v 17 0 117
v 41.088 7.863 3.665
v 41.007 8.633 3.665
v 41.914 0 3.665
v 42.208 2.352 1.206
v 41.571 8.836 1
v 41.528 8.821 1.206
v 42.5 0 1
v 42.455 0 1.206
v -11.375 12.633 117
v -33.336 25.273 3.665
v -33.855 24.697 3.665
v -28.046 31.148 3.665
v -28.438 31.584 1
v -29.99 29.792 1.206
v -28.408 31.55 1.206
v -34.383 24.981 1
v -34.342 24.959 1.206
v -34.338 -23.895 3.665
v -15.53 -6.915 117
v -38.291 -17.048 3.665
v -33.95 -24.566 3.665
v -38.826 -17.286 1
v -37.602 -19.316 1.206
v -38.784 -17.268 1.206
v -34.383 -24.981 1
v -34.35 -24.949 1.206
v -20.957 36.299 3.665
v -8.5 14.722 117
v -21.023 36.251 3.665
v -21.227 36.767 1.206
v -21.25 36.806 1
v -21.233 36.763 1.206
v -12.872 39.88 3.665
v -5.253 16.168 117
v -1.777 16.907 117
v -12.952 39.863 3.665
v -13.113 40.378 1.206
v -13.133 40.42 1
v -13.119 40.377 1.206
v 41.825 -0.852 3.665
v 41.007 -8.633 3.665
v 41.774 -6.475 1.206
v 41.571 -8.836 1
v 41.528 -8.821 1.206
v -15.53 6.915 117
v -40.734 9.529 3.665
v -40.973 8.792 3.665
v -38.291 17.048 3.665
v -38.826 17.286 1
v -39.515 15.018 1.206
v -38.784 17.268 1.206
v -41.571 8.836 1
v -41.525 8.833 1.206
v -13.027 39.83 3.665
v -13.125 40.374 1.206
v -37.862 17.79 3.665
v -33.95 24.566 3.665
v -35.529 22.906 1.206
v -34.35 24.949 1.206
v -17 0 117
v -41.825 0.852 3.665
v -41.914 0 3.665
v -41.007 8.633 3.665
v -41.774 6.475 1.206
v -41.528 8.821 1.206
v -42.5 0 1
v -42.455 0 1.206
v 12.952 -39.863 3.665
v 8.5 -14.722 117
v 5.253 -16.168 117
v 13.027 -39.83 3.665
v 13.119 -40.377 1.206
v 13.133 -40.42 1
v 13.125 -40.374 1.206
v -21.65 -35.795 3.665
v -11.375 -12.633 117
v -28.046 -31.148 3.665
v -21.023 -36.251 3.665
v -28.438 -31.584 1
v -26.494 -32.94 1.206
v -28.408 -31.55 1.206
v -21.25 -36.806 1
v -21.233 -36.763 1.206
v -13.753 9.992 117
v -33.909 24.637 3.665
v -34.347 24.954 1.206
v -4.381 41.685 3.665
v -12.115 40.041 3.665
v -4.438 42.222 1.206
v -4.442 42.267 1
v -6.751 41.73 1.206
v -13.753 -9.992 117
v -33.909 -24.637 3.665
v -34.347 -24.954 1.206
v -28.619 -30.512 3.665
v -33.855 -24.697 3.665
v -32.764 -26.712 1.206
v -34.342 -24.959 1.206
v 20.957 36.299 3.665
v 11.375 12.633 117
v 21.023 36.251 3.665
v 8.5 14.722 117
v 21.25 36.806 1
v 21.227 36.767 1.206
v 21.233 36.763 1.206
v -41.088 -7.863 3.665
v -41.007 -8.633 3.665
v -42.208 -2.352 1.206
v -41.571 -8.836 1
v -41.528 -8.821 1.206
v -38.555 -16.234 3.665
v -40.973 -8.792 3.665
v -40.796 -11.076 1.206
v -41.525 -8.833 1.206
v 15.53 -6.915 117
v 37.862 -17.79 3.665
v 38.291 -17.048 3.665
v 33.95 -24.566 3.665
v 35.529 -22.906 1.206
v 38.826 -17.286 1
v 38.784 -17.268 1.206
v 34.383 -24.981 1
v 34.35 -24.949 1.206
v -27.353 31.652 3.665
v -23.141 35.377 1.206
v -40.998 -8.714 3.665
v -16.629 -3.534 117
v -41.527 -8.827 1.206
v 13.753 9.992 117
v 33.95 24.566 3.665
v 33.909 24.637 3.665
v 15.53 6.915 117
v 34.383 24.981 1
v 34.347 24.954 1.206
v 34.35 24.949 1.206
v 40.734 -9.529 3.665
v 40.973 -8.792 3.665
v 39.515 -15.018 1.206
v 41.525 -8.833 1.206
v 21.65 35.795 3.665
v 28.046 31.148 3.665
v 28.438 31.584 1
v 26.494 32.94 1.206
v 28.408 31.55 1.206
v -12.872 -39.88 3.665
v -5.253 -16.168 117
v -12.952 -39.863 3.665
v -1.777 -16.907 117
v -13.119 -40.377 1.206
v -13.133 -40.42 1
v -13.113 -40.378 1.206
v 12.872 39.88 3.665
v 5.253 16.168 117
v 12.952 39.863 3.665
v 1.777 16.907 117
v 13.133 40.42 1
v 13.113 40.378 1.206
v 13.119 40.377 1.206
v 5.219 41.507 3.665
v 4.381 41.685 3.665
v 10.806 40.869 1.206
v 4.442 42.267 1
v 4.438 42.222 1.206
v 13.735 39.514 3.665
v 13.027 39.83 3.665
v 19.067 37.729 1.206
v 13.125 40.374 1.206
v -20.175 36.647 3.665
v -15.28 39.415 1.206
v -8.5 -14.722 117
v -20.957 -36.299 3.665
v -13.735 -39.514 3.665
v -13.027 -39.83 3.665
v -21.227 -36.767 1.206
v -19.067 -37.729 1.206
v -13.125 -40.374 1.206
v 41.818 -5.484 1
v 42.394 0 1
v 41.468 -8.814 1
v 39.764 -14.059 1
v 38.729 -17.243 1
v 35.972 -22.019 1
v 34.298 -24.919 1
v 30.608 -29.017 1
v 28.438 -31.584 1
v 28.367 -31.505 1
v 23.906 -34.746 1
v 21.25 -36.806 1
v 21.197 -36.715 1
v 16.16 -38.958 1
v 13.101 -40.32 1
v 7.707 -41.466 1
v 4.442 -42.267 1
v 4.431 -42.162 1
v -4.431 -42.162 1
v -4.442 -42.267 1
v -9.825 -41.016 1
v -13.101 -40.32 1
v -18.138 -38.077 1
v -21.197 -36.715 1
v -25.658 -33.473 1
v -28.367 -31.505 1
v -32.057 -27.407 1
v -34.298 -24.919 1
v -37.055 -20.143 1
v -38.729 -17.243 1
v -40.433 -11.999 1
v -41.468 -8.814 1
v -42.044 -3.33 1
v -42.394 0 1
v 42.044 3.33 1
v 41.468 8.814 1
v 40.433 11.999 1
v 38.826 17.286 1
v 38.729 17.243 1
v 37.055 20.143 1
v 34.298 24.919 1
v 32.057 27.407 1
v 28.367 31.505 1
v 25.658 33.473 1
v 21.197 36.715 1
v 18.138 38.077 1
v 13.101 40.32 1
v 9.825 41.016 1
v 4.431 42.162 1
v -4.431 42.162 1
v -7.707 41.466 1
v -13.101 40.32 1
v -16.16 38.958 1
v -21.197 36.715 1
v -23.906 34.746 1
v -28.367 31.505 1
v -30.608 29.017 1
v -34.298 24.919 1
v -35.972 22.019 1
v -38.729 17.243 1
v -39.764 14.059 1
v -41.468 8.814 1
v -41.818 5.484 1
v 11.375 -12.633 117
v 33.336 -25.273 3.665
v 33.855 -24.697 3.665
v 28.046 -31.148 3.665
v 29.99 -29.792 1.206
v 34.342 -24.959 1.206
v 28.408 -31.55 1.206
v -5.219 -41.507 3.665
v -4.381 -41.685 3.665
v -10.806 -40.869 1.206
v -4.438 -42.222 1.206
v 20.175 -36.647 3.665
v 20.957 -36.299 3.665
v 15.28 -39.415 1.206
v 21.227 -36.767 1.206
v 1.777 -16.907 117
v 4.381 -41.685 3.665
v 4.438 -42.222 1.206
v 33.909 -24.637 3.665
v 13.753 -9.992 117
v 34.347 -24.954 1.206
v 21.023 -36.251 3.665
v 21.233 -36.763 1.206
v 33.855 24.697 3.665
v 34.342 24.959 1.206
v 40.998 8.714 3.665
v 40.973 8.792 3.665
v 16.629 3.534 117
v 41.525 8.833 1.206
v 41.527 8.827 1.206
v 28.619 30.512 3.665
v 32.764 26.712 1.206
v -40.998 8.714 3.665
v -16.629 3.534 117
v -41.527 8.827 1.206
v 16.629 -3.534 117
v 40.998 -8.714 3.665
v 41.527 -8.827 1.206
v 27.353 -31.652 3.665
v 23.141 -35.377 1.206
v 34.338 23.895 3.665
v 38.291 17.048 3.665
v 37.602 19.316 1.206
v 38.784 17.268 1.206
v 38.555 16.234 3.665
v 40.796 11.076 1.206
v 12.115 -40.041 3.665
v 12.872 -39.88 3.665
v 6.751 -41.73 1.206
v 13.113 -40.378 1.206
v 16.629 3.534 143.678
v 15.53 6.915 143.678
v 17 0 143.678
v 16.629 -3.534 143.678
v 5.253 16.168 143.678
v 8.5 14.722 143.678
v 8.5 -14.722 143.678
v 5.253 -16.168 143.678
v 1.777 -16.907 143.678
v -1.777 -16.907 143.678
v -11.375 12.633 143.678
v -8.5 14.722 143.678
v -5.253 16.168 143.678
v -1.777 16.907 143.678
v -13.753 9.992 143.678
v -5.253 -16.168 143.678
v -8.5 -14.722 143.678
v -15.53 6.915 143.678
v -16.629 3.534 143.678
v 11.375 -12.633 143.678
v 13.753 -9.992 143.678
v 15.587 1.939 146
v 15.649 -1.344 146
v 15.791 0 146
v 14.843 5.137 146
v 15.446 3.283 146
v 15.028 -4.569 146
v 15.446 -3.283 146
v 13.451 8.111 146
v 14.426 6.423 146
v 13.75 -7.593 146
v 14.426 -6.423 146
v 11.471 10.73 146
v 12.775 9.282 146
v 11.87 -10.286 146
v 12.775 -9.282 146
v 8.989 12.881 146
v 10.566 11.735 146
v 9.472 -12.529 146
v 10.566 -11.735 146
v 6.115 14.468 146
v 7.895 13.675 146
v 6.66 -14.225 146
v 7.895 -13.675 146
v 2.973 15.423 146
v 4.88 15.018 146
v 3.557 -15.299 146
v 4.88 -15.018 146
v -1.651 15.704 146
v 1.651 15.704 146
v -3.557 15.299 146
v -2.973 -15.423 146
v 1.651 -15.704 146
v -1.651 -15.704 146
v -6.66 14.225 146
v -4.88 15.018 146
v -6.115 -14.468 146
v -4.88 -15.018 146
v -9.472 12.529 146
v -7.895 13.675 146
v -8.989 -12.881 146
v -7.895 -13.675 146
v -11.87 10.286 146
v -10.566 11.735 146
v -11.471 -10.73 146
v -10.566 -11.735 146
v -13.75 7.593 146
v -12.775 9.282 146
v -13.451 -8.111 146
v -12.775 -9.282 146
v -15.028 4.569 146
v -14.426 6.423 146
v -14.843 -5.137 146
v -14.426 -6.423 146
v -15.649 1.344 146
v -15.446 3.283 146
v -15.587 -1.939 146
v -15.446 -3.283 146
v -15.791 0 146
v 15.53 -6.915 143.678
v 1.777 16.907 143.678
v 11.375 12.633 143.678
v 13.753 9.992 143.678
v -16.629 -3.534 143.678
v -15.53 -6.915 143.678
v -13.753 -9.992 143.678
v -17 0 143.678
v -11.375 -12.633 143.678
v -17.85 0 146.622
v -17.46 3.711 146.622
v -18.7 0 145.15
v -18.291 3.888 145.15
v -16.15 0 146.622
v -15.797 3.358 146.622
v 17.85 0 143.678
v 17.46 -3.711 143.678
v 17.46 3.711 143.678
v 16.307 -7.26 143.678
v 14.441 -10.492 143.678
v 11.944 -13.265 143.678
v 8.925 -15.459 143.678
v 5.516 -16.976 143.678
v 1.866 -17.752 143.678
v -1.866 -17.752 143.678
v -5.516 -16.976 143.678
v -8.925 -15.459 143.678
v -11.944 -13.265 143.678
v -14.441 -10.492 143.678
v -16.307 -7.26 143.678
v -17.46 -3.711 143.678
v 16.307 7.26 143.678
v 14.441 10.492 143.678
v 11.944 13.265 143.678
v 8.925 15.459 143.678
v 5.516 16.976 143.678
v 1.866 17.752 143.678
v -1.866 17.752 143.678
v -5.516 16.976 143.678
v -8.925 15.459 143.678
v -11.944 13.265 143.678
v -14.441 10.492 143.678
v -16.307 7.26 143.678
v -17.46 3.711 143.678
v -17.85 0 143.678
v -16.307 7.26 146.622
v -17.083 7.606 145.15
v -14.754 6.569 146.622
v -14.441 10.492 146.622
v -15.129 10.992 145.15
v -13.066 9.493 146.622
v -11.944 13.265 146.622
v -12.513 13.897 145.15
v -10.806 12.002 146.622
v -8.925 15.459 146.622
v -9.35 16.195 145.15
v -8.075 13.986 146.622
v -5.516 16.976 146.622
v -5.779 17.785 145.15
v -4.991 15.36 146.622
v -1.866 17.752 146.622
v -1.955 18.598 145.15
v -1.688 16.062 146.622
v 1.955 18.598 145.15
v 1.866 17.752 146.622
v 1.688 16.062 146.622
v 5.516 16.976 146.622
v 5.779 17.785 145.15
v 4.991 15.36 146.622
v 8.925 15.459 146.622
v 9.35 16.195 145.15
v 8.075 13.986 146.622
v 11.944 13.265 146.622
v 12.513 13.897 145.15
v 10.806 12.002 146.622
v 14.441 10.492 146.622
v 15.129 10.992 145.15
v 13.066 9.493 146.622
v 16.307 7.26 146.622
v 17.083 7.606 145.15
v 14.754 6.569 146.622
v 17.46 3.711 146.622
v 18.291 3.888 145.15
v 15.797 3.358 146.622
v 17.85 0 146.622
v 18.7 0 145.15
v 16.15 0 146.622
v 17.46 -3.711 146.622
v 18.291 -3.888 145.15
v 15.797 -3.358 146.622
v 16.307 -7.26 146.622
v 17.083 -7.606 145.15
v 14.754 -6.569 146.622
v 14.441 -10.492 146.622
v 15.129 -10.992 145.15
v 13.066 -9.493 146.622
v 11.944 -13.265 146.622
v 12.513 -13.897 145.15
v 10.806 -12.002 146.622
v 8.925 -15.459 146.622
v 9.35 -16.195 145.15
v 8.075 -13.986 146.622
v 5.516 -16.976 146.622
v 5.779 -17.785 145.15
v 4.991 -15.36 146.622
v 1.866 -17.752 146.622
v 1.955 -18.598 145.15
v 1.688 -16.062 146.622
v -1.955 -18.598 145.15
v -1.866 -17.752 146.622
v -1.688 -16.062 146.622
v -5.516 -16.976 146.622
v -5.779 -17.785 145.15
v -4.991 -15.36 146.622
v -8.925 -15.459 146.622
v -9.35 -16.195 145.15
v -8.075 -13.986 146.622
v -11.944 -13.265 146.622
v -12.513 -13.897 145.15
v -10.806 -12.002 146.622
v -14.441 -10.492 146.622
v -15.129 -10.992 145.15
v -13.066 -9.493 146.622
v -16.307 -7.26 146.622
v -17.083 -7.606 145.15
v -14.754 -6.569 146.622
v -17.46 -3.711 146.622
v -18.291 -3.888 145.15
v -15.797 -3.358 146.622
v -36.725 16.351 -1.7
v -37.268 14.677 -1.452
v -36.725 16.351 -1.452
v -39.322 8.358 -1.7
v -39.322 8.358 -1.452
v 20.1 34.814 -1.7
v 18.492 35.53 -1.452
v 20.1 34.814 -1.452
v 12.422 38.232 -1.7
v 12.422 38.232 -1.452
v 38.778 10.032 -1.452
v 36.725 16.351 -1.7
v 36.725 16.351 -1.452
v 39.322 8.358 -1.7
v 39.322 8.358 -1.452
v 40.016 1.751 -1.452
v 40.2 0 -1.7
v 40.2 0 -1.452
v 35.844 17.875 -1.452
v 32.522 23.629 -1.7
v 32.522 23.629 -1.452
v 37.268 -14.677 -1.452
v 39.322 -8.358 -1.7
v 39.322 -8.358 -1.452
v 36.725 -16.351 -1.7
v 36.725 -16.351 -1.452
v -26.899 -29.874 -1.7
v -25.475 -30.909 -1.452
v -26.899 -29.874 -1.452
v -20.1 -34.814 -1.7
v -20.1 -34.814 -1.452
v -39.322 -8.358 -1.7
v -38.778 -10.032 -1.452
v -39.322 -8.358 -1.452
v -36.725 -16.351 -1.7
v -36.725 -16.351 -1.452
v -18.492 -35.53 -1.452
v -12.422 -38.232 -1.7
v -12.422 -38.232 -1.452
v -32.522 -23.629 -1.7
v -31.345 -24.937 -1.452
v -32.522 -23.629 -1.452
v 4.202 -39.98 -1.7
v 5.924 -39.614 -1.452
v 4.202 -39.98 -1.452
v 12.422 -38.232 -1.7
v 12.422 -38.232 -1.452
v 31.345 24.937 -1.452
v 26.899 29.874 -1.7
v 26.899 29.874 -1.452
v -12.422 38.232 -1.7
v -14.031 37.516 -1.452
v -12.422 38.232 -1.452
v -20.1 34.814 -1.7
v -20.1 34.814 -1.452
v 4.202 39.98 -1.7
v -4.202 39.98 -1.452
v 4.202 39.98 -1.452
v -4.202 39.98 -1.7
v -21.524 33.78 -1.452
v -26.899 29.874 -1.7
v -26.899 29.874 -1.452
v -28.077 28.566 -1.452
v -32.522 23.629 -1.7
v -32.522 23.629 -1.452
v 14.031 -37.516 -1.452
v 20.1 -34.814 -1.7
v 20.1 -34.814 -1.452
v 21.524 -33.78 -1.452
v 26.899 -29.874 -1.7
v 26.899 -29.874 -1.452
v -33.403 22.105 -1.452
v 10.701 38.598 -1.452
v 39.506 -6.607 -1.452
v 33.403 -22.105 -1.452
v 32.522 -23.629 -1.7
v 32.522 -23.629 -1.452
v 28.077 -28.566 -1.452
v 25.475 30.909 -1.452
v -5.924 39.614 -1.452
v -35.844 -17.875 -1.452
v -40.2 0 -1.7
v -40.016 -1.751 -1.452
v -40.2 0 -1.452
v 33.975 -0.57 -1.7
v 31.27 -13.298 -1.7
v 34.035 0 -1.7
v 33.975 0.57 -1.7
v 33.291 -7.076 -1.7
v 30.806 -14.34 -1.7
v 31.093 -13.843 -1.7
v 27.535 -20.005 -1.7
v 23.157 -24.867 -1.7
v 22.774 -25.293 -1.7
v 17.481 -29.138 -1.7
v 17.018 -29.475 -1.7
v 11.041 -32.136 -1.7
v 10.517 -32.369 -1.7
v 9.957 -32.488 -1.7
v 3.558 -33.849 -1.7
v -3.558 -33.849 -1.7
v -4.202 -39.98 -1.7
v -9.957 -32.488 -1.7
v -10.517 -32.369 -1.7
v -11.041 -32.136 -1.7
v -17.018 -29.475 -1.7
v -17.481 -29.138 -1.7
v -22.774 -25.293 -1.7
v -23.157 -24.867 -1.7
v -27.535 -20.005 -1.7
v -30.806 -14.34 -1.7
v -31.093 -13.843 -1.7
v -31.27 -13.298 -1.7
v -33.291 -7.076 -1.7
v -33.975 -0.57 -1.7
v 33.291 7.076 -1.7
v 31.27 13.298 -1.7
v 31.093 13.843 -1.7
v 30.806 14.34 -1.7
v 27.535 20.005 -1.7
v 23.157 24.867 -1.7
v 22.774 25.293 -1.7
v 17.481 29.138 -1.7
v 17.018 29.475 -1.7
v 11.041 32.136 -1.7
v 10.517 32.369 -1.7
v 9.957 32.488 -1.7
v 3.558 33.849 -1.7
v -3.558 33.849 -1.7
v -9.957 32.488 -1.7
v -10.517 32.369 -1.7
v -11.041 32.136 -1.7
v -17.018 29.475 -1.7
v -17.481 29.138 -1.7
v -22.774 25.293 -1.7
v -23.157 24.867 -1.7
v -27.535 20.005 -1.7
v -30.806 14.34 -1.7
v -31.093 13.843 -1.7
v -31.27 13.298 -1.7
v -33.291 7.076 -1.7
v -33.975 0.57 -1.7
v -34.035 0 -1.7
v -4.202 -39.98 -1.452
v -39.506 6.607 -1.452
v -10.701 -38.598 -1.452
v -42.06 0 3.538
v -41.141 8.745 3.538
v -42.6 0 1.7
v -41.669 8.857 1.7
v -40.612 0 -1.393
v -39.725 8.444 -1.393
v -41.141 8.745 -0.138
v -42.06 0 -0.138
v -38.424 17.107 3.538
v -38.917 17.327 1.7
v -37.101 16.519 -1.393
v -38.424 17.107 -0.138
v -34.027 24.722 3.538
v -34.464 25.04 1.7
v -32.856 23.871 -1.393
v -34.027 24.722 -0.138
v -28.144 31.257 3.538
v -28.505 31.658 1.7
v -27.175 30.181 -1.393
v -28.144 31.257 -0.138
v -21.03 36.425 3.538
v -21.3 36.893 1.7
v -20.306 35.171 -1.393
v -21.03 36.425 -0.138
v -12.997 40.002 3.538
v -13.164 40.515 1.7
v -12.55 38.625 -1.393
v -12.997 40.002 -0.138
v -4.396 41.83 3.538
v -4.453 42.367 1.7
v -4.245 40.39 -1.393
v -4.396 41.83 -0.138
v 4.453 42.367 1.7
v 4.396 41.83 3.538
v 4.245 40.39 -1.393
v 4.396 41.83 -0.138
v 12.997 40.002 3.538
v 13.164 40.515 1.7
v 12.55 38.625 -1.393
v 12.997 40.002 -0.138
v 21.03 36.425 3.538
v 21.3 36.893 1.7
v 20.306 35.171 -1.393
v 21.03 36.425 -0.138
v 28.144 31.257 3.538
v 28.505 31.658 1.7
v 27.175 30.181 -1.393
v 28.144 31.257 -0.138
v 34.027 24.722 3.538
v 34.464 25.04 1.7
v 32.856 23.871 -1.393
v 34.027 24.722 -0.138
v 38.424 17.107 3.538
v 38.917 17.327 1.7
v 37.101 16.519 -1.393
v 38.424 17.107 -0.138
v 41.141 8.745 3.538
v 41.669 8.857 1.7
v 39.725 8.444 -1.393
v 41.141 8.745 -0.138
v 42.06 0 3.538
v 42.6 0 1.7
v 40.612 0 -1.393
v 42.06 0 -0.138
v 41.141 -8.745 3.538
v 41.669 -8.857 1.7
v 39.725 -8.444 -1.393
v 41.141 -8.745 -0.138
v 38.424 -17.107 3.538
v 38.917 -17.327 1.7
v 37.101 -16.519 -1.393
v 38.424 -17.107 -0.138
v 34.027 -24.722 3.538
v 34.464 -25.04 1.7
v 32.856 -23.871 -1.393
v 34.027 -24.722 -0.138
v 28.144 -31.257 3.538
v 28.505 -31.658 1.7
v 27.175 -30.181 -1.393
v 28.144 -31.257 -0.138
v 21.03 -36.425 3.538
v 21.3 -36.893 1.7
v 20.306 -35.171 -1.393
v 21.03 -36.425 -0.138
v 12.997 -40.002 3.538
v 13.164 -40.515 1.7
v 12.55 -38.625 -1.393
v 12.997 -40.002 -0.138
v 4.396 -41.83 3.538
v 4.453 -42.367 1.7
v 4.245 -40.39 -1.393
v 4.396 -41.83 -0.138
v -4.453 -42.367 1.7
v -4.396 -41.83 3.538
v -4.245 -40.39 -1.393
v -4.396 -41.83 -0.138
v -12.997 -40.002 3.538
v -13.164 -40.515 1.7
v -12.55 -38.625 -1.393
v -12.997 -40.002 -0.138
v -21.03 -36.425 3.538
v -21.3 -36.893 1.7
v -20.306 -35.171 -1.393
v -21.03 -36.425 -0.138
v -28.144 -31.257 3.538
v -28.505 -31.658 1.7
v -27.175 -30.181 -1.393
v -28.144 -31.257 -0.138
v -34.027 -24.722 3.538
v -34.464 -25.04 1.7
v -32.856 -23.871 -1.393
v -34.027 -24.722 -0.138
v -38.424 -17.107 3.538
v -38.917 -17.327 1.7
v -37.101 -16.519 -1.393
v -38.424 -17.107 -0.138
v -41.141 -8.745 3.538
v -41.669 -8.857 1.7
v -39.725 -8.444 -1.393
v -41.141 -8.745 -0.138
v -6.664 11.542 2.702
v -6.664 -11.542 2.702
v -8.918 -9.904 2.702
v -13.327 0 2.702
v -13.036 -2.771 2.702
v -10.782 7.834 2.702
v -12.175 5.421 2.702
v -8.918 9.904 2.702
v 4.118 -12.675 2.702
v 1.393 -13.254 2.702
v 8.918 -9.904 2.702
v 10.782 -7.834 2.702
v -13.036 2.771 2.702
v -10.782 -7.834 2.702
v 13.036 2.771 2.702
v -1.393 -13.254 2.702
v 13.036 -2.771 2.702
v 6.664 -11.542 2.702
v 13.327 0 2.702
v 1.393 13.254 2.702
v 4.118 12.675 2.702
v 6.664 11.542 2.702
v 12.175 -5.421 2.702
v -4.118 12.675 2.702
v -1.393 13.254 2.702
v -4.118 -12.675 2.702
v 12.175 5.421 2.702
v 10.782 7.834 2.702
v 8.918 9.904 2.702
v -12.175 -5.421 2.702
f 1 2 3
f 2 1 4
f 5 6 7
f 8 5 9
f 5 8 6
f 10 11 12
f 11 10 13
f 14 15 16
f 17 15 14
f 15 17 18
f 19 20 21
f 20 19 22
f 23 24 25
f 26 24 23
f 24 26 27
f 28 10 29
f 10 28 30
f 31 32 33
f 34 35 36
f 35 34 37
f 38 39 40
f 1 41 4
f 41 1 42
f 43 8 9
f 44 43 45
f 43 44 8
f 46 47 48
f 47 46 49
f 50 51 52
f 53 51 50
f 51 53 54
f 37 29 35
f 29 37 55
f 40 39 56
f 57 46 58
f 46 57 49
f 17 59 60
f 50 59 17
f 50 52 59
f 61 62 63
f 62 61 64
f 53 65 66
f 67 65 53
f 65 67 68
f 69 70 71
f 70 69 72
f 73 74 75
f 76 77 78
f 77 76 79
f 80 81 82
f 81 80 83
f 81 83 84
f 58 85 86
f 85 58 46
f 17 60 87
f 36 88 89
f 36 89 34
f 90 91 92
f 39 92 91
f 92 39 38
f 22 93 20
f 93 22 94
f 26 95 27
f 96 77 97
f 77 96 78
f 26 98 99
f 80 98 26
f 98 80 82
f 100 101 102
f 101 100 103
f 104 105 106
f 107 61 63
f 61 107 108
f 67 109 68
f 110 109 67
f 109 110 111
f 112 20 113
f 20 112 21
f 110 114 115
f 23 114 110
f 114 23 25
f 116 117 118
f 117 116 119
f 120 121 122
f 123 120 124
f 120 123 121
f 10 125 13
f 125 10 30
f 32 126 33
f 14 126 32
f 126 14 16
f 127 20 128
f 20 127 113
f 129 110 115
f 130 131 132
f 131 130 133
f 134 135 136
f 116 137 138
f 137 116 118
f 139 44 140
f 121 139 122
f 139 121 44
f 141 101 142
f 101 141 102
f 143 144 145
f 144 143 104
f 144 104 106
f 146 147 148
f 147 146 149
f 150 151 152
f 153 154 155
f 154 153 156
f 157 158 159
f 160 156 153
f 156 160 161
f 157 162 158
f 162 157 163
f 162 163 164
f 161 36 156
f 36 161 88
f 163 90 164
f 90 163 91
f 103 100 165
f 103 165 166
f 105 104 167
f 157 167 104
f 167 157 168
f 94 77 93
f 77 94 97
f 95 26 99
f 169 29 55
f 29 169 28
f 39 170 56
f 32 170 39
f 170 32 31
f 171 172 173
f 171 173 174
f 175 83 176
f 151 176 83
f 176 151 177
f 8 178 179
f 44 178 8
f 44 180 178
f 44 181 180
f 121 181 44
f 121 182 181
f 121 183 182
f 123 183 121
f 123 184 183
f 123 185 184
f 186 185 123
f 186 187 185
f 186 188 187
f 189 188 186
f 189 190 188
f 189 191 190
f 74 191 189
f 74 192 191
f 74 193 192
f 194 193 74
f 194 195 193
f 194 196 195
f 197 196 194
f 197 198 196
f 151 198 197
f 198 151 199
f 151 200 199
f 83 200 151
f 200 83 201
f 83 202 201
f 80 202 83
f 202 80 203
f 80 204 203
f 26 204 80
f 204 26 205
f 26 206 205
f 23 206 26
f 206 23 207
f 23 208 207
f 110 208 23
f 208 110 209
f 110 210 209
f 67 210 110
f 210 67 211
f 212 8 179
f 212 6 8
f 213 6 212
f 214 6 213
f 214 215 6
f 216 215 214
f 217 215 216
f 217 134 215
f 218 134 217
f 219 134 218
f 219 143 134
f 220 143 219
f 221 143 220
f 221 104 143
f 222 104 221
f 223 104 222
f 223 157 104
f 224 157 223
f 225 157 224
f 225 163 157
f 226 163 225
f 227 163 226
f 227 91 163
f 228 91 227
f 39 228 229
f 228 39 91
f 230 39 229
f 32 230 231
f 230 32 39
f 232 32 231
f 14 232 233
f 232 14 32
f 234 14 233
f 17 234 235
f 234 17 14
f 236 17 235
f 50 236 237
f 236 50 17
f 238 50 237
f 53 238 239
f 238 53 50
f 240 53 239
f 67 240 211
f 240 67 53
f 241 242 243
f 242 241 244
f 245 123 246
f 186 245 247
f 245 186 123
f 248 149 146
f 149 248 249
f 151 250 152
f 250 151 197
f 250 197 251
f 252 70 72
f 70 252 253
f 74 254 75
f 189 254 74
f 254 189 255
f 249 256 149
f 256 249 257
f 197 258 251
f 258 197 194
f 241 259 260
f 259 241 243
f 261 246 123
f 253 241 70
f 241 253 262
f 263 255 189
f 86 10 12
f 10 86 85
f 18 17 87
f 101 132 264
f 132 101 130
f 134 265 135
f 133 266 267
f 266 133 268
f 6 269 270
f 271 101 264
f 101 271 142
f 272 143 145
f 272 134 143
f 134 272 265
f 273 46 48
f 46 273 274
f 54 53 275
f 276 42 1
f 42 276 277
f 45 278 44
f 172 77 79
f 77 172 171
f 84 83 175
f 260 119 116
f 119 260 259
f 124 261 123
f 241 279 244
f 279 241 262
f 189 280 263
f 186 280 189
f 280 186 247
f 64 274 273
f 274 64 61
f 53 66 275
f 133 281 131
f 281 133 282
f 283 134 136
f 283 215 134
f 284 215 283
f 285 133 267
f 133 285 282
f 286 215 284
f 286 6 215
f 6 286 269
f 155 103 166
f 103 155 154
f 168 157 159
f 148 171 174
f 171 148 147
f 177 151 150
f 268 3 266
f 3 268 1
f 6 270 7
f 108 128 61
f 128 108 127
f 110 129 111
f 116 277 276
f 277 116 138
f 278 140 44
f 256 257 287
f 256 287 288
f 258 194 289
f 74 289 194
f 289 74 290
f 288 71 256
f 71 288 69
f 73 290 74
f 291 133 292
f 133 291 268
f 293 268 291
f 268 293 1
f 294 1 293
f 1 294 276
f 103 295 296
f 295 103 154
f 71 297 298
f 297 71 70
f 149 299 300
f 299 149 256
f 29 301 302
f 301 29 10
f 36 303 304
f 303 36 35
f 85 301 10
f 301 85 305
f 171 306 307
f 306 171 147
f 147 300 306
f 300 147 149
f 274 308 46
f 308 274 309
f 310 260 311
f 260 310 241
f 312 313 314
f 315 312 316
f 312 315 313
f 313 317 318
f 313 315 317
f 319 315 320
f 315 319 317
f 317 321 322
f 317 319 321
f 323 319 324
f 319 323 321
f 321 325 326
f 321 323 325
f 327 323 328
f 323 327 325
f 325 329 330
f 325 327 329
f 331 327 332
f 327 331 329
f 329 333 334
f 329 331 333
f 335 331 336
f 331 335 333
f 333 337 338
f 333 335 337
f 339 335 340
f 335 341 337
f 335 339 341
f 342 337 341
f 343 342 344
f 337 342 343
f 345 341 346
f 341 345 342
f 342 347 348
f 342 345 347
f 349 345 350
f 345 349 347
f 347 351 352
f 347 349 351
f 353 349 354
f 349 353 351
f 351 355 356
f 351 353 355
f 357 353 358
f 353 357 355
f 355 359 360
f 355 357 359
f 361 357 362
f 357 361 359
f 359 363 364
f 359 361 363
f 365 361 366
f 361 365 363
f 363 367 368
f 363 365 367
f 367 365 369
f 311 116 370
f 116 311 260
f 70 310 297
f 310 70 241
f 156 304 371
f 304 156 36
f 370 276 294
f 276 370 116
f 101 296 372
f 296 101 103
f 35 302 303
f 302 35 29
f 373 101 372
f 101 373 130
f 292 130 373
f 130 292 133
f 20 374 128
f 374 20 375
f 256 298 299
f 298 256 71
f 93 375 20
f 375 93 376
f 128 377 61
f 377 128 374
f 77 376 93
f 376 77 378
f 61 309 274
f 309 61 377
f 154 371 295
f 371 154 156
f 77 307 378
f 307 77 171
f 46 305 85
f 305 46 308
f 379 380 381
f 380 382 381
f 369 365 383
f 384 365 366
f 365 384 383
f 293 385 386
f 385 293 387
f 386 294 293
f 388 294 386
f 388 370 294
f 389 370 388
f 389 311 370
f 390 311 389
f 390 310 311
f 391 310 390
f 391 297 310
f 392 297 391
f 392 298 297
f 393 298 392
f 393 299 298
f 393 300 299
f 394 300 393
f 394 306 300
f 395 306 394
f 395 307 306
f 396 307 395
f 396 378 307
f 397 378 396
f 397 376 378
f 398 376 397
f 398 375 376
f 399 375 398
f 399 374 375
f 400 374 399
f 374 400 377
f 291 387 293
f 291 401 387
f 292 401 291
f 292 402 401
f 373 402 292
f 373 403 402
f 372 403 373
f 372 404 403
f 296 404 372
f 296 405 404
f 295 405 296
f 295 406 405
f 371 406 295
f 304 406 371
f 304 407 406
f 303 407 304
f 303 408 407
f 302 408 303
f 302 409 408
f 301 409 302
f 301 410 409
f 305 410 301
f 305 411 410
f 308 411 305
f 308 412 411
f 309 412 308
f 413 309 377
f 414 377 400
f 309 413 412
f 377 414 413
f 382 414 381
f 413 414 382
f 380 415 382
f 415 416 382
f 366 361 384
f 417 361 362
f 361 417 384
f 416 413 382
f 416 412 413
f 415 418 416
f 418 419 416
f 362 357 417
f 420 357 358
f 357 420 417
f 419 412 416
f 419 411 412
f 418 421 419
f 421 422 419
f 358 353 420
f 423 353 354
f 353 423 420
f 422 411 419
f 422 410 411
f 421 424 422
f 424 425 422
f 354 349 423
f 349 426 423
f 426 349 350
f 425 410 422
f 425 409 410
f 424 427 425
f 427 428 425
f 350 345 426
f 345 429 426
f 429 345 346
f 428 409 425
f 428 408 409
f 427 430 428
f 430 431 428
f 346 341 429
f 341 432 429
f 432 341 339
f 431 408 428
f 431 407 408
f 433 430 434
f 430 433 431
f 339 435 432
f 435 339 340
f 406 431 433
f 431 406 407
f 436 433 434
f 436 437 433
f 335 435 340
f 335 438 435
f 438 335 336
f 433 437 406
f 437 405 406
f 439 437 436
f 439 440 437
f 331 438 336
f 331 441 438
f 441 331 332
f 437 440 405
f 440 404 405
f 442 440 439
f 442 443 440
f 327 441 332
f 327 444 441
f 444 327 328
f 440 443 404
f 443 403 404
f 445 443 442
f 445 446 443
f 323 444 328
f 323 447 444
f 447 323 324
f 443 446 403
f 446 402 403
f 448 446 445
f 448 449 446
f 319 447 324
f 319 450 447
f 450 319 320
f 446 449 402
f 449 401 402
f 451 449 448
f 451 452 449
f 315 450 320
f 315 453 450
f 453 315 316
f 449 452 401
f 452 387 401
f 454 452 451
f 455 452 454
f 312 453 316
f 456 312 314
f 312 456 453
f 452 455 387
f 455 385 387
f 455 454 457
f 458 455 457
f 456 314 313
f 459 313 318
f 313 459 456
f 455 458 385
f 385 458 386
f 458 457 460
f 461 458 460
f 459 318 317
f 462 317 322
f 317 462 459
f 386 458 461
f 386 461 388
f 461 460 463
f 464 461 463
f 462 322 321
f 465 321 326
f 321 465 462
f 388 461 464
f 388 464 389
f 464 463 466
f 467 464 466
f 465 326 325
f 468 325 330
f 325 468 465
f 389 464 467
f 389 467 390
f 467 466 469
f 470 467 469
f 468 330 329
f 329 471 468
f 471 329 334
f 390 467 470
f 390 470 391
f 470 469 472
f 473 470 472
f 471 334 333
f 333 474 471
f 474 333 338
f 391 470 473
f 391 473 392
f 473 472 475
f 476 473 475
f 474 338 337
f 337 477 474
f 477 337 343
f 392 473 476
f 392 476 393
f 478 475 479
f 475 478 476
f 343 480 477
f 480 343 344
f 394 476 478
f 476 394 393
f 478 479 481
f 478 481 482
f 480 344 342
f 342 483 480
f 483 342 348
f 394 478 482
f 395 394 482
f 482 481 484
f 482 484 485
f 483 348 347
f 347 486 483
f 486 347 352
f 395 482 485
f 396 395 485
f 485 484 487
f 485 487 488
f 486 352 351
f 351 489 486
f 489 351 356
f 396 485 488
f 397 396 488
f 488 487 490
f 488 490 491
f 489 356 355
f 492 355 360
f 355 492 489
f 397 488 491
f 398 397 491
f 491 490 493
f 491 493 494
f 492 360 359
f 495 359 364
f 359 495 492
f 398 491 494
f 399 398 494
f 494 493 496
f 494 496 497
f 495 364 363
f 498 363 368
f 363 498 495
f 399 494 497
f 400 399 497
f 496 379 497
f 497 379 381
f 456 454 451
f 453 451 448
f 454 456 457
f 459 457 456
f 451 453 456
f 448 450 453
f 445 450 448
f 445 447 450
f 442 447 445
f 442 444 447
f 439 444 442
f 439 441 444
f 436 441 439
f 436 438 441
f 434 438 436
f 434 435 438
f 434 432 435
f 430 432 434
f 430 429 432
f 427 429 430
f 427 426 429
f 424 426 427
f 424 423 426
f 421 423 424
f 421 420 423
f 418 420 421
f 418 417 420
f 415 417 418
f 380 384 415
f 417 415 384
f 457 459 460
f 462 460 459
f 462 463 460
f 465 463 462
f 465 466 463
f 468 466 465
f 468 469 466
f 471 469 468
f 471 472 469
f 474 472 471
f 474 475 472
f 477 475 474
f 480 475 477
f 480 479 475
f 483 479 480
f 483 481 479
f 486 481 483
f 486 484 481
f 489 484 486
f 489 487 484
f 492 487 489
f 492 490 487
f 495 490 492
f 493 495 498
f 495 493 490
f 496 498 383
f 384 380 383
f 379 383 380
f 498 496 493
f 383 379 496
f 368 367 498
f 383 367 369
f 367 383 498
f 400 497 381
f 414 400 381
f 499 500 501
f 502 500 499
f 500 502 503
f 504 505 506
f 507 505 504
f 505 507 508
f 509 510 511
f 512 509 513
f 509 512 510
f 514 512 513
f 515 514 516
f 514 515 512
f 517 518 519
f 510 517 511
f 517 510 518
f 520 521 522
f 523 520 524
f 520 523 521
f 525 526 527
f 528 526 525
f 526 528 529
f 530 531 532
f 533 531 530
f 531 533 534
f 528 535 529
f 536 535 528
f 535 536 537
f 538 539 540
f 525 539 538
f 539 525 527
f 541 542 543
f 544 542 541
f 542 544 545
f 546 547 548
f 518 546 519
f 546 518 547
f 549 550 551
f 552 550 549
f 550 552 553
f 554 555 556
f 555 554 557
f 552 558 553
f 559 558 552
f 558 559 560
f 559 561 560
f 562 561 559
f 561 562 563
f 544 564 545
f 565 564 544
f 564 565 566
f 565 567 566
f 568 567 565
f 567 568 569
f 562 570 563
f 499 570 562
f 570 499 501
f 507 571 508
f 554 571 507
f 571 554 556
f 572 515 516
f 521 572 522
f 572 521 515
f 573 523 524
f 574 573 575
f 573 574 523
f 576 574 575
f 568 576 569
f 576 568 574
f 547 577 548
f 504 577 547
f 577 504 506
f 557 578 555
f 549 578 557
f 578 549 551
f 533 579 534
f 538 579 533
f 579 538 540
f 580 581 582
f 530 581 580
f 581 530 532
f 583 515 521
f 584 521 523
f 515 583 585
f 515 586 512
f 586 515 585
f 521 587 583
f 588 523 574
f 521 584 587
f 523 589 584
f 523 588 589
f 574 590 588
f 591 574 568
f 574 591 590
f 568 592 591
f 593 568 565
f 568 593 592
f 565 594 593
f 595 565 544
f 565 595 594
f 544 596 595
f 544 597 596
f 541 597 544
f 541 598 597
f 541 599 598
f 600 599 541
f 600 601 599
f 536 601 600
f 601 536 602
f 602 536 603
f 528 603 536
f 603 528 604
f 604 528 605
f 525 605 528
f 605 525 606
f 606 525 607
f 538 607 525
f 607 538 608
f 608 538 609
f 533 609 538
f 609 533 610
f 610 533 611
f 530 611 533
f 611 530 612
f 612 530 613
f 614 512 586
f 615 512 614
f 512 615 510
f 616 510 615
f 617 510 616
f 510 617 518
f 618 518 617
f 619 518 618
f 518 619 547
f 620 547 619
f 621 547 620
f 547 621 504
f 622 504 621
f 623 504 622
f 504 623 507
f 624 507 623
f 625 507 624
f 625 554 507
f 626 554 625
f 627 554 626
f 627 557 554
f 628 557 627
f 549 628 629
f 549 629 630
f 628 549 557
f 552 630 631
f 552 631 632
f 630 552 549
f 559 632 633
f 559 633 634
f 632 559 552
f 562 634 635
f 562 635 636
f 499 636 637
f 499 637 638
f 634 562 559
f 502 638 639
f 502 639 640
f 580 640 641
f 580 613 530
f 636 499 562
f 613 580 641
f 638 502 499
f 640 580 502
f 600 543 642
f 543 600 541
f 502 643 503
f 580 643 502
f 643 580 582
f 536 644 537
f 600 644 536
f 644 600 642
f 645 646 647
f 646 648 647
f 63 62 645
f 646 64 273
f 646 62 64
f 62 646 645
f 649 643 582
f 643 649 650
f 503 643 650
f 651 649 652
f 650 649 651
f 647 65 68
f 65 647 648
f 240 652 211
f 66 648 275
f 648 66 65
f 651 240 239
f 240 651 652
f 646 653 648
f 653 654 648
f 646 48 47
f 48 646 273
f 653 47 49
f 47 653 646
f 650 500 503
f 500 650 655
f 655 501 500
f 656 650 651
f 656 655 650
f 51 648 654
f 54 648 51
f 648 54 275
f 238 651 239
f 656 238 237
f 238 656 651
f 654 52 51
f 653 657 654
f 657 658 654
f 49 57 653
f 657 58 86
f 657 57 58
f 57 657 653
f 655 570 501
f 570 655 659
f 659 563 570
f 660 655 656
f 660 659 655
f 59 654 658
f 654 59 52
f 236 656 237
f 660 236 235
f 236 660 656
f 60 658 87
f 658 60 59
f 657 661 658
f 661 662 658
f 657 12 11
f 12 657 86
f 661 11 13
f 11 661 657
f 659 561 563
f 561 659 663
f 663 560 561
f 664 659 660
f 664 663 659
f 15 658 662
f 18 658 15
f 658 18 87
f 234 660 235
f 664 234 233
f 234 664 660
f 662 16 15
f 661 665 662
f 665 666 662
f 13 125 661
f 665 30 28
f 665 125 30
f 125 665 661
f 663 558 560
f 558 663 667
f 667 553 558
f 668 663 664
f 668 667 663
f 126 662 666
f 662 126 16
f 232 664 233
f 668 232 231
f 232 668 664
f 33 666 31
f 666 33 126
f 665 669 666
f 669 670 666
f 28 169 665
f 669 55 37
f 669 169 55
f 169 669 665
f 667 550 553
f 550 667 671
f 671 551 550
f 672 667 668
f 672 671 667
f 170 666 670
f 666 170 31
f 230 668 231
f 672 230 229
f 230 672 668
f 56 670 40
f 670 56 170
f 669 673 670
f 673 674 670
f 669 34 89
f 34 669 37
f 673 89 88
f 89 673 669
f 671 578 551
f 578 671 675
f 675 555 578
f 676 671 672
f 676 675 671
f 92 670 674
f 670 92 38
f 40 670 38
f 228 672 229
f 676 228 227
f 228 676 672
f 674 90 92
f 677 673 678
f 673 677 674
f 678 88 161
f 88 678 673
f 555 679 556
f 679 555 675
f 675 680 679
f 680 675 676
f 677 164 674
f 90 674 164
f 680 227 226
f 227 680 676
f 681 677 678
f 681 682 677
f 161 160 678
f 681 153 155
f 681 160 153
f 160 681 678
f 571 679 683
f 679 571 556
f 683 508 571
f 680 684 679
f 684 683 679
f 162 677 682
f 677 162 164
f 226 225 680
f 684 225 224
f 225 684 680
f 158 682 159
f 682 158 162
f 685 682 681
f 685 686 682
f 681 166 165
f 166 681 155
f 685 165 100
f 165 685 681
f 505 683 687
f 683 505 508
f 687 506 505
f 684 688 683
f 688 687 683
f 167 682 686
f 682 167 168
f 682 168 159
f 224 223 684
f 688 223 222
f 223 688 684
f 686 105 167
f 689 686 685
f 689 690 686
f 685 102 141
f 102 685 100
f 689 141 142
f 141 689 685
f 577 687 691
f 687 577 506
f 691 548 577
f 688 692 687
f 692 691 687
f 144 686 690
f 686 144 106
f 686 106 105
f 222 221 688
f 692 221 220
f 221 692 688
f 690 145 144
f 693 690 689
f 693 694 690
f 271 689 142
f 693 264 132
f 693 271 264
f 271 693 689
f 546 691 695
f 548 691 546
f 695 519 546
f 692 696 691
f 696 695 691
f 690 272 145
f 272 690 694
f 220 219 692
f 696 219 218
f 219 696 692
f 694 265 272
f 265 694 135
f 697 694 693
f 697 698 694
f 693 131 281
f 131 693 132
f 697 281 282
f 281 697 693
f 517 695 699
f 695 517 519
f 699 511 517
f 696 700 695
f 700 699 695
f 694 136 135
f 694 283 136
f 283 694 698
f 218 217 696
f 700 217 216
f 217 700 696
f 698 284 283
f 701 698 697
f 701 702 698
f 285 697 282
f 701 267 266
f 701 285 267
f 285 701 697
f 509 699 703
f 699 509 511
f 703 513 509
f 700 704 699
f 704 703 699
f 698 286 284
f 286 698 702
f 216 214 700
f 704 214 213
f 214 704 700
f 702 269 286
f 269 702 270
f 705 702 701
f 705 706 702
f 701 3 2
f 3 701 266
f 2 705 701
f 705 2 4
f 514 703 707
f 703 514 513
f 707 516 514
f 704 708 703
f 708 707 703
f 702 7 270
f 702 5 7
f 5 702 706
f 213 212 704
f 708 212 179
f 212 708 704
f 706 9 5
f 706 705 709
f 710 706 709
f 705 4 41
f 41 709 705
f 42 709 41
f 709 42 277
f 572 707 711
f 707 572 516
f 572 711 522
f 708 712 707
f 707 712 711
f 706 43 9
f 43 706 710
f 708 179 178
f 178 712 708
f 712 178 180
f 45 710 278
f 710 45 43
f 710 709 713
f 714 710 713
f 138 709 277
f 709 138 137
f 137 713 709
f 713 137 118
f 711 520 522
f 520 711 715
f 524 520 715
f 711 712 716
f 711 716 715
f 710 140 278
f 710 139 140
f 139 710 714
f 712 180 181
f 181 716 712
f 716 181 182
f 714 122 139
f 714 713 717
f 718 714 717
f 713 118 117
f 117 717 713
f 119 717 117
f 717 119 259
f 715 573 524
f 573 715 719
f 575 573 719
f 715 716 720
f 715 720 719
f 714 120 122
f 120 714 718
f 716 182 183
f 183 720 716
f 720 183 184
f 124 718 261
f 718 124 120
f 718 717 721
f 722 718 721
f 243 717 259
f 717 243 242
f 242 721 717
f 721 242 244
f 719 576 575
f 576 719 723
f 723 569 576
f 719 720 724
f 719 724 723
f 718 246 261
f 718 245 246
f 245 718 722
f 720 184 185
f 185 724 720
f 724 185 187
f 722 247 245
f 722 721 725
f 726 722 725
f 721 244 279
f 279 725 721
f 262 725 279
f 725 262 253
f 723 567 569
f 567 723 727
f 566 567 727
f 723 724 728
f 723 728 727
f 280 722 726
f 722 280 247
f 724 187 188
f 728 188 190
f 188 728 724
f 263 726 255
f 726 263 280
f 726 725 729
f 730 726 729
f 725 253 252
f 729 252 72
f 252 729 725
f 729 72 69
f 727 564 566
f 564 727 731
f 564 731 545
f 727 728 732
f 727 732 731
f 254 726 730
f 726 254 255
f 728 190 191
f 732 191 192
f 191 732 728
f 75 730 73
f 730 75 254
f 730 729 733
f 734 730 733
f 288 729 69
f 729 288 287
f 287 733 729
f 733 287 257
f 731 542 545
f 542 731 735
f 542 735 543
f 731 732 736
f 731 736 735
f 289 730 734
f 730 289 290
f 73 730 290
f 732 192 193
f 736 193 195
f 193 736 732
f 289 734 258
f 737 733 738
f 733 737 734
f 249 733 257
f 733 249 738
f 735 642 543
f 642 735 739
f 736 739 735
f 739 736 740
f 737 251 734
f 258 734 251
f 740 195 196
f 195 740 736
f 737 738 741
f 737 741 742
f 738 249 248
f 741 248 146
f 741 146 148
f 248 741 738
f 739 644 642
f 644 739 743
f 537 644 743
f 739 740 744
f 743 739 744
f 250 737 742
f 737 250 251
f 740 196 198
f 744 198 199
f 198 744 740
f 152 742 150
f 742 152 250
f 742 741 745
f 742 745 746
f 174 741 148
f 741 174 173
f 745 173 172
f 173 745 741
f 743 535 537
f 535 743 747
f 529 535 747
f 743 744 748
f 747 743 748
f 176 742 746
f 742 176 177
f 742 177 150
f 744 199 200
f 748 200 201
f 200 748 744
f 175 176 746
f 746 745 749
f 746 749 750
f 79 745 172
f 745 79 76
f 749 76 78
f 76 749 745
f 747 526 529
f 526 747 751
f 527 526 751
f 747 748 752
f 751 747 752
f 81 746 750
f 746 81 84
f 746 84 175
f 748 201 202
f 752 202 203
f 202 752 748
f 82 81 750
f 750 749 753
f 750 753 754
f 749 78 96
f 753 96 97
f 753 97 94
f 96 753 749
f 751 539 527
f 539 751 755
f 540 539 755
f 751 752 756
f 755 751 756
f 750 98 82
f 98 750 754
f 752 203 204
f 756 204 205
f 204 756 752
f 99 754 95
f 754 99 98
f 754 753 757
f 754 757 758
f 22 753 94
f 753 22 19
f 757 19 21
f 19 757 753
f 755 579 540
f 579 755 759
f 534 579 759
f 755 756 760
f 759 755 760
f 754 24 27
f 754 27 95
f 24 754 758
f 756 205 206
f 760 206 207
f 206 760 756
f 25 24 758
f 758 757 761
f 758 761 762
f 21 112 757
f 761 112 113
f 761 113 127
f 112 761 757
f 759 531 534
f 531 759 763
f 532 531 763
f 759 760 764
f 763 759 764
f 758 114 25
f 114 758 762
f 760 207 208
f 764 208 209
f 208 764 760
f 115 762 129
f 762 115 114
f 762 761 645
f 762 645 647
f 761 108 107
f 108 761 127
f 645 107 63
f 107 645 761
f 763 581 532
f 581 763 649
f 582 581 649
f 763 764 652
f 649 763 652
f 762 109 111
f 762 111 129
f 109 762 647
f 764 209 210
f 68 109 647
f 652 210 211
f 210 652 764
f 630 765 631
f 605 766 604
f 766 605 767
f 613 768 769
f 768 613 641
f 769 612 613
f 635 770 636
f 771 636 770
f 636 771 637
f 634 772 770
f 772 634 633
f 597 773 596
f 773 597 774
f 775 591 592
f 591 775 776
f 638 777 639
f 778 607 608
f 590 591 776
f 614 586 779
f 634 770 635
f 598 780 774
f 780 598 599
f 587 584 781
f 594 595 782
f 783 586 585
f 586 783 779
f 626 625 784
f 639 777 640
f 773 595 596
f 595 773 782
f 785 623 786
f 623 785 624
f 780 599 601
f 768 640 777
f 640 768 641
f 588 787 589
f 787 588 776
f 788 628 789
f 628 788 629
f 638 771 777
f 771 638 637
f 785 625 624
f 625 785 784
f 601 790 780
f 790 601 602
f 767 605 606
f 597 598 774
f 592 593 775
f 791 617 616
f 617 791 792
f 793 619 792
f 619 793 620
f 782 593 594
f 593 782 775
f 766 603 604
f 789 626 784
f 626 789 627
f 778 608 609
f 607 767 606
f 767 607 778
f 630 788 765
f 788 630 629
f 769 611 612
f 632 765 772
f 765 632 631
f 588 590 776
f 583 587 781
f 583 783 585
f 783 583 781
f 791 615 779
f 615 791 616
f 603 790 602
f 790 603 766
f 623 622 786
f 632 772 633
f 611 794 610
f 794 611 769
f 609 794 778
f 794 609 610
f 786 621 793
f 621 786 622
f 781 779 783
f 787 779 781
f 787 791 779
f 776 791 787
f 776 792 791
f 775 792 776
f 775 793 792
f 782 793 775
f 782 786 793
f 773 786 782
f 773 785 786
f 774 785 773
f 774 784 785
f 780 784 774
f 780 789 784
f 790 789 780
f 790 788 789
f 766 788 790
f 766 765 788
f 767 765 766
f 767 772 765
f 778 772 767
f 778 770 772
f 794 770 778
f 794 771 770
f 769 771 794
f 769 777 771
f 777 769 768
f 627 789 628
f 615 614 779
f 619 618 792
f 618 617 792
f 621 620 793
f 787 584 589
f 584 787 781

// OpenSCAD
difference() {
    union() {
        translate([0, 0, 1]) {
            union() {
                cylinder(h=116, r2=17, r1=42.5);
                translate([0, 0, 116]) {
                    cylinder(h=29, r2=17, r1=17);
                };
                translate([0, 0, 144.15]) {
                    rotate_extrude(convexity=10) {
                        translate([17, 0, 0]) {
                            circle(r=1.7);
                        };
                    };
                };
            };
        };
        union() {
            translate([0, 0, -1.7]) {
                cylinder(h=3.4, r2=40.2, r1=40.2);
            };
            translate([0, 0, 1.7]) {
                rotate_extrude(convexity=10) {
                    translate([39.2, 0, 0]) {
                        circle(r=3.4);
                    };
                };
            };
        };
    };
    translate([0, 0, -124.1]) {
        sphere(r=127.5);
    };
};
